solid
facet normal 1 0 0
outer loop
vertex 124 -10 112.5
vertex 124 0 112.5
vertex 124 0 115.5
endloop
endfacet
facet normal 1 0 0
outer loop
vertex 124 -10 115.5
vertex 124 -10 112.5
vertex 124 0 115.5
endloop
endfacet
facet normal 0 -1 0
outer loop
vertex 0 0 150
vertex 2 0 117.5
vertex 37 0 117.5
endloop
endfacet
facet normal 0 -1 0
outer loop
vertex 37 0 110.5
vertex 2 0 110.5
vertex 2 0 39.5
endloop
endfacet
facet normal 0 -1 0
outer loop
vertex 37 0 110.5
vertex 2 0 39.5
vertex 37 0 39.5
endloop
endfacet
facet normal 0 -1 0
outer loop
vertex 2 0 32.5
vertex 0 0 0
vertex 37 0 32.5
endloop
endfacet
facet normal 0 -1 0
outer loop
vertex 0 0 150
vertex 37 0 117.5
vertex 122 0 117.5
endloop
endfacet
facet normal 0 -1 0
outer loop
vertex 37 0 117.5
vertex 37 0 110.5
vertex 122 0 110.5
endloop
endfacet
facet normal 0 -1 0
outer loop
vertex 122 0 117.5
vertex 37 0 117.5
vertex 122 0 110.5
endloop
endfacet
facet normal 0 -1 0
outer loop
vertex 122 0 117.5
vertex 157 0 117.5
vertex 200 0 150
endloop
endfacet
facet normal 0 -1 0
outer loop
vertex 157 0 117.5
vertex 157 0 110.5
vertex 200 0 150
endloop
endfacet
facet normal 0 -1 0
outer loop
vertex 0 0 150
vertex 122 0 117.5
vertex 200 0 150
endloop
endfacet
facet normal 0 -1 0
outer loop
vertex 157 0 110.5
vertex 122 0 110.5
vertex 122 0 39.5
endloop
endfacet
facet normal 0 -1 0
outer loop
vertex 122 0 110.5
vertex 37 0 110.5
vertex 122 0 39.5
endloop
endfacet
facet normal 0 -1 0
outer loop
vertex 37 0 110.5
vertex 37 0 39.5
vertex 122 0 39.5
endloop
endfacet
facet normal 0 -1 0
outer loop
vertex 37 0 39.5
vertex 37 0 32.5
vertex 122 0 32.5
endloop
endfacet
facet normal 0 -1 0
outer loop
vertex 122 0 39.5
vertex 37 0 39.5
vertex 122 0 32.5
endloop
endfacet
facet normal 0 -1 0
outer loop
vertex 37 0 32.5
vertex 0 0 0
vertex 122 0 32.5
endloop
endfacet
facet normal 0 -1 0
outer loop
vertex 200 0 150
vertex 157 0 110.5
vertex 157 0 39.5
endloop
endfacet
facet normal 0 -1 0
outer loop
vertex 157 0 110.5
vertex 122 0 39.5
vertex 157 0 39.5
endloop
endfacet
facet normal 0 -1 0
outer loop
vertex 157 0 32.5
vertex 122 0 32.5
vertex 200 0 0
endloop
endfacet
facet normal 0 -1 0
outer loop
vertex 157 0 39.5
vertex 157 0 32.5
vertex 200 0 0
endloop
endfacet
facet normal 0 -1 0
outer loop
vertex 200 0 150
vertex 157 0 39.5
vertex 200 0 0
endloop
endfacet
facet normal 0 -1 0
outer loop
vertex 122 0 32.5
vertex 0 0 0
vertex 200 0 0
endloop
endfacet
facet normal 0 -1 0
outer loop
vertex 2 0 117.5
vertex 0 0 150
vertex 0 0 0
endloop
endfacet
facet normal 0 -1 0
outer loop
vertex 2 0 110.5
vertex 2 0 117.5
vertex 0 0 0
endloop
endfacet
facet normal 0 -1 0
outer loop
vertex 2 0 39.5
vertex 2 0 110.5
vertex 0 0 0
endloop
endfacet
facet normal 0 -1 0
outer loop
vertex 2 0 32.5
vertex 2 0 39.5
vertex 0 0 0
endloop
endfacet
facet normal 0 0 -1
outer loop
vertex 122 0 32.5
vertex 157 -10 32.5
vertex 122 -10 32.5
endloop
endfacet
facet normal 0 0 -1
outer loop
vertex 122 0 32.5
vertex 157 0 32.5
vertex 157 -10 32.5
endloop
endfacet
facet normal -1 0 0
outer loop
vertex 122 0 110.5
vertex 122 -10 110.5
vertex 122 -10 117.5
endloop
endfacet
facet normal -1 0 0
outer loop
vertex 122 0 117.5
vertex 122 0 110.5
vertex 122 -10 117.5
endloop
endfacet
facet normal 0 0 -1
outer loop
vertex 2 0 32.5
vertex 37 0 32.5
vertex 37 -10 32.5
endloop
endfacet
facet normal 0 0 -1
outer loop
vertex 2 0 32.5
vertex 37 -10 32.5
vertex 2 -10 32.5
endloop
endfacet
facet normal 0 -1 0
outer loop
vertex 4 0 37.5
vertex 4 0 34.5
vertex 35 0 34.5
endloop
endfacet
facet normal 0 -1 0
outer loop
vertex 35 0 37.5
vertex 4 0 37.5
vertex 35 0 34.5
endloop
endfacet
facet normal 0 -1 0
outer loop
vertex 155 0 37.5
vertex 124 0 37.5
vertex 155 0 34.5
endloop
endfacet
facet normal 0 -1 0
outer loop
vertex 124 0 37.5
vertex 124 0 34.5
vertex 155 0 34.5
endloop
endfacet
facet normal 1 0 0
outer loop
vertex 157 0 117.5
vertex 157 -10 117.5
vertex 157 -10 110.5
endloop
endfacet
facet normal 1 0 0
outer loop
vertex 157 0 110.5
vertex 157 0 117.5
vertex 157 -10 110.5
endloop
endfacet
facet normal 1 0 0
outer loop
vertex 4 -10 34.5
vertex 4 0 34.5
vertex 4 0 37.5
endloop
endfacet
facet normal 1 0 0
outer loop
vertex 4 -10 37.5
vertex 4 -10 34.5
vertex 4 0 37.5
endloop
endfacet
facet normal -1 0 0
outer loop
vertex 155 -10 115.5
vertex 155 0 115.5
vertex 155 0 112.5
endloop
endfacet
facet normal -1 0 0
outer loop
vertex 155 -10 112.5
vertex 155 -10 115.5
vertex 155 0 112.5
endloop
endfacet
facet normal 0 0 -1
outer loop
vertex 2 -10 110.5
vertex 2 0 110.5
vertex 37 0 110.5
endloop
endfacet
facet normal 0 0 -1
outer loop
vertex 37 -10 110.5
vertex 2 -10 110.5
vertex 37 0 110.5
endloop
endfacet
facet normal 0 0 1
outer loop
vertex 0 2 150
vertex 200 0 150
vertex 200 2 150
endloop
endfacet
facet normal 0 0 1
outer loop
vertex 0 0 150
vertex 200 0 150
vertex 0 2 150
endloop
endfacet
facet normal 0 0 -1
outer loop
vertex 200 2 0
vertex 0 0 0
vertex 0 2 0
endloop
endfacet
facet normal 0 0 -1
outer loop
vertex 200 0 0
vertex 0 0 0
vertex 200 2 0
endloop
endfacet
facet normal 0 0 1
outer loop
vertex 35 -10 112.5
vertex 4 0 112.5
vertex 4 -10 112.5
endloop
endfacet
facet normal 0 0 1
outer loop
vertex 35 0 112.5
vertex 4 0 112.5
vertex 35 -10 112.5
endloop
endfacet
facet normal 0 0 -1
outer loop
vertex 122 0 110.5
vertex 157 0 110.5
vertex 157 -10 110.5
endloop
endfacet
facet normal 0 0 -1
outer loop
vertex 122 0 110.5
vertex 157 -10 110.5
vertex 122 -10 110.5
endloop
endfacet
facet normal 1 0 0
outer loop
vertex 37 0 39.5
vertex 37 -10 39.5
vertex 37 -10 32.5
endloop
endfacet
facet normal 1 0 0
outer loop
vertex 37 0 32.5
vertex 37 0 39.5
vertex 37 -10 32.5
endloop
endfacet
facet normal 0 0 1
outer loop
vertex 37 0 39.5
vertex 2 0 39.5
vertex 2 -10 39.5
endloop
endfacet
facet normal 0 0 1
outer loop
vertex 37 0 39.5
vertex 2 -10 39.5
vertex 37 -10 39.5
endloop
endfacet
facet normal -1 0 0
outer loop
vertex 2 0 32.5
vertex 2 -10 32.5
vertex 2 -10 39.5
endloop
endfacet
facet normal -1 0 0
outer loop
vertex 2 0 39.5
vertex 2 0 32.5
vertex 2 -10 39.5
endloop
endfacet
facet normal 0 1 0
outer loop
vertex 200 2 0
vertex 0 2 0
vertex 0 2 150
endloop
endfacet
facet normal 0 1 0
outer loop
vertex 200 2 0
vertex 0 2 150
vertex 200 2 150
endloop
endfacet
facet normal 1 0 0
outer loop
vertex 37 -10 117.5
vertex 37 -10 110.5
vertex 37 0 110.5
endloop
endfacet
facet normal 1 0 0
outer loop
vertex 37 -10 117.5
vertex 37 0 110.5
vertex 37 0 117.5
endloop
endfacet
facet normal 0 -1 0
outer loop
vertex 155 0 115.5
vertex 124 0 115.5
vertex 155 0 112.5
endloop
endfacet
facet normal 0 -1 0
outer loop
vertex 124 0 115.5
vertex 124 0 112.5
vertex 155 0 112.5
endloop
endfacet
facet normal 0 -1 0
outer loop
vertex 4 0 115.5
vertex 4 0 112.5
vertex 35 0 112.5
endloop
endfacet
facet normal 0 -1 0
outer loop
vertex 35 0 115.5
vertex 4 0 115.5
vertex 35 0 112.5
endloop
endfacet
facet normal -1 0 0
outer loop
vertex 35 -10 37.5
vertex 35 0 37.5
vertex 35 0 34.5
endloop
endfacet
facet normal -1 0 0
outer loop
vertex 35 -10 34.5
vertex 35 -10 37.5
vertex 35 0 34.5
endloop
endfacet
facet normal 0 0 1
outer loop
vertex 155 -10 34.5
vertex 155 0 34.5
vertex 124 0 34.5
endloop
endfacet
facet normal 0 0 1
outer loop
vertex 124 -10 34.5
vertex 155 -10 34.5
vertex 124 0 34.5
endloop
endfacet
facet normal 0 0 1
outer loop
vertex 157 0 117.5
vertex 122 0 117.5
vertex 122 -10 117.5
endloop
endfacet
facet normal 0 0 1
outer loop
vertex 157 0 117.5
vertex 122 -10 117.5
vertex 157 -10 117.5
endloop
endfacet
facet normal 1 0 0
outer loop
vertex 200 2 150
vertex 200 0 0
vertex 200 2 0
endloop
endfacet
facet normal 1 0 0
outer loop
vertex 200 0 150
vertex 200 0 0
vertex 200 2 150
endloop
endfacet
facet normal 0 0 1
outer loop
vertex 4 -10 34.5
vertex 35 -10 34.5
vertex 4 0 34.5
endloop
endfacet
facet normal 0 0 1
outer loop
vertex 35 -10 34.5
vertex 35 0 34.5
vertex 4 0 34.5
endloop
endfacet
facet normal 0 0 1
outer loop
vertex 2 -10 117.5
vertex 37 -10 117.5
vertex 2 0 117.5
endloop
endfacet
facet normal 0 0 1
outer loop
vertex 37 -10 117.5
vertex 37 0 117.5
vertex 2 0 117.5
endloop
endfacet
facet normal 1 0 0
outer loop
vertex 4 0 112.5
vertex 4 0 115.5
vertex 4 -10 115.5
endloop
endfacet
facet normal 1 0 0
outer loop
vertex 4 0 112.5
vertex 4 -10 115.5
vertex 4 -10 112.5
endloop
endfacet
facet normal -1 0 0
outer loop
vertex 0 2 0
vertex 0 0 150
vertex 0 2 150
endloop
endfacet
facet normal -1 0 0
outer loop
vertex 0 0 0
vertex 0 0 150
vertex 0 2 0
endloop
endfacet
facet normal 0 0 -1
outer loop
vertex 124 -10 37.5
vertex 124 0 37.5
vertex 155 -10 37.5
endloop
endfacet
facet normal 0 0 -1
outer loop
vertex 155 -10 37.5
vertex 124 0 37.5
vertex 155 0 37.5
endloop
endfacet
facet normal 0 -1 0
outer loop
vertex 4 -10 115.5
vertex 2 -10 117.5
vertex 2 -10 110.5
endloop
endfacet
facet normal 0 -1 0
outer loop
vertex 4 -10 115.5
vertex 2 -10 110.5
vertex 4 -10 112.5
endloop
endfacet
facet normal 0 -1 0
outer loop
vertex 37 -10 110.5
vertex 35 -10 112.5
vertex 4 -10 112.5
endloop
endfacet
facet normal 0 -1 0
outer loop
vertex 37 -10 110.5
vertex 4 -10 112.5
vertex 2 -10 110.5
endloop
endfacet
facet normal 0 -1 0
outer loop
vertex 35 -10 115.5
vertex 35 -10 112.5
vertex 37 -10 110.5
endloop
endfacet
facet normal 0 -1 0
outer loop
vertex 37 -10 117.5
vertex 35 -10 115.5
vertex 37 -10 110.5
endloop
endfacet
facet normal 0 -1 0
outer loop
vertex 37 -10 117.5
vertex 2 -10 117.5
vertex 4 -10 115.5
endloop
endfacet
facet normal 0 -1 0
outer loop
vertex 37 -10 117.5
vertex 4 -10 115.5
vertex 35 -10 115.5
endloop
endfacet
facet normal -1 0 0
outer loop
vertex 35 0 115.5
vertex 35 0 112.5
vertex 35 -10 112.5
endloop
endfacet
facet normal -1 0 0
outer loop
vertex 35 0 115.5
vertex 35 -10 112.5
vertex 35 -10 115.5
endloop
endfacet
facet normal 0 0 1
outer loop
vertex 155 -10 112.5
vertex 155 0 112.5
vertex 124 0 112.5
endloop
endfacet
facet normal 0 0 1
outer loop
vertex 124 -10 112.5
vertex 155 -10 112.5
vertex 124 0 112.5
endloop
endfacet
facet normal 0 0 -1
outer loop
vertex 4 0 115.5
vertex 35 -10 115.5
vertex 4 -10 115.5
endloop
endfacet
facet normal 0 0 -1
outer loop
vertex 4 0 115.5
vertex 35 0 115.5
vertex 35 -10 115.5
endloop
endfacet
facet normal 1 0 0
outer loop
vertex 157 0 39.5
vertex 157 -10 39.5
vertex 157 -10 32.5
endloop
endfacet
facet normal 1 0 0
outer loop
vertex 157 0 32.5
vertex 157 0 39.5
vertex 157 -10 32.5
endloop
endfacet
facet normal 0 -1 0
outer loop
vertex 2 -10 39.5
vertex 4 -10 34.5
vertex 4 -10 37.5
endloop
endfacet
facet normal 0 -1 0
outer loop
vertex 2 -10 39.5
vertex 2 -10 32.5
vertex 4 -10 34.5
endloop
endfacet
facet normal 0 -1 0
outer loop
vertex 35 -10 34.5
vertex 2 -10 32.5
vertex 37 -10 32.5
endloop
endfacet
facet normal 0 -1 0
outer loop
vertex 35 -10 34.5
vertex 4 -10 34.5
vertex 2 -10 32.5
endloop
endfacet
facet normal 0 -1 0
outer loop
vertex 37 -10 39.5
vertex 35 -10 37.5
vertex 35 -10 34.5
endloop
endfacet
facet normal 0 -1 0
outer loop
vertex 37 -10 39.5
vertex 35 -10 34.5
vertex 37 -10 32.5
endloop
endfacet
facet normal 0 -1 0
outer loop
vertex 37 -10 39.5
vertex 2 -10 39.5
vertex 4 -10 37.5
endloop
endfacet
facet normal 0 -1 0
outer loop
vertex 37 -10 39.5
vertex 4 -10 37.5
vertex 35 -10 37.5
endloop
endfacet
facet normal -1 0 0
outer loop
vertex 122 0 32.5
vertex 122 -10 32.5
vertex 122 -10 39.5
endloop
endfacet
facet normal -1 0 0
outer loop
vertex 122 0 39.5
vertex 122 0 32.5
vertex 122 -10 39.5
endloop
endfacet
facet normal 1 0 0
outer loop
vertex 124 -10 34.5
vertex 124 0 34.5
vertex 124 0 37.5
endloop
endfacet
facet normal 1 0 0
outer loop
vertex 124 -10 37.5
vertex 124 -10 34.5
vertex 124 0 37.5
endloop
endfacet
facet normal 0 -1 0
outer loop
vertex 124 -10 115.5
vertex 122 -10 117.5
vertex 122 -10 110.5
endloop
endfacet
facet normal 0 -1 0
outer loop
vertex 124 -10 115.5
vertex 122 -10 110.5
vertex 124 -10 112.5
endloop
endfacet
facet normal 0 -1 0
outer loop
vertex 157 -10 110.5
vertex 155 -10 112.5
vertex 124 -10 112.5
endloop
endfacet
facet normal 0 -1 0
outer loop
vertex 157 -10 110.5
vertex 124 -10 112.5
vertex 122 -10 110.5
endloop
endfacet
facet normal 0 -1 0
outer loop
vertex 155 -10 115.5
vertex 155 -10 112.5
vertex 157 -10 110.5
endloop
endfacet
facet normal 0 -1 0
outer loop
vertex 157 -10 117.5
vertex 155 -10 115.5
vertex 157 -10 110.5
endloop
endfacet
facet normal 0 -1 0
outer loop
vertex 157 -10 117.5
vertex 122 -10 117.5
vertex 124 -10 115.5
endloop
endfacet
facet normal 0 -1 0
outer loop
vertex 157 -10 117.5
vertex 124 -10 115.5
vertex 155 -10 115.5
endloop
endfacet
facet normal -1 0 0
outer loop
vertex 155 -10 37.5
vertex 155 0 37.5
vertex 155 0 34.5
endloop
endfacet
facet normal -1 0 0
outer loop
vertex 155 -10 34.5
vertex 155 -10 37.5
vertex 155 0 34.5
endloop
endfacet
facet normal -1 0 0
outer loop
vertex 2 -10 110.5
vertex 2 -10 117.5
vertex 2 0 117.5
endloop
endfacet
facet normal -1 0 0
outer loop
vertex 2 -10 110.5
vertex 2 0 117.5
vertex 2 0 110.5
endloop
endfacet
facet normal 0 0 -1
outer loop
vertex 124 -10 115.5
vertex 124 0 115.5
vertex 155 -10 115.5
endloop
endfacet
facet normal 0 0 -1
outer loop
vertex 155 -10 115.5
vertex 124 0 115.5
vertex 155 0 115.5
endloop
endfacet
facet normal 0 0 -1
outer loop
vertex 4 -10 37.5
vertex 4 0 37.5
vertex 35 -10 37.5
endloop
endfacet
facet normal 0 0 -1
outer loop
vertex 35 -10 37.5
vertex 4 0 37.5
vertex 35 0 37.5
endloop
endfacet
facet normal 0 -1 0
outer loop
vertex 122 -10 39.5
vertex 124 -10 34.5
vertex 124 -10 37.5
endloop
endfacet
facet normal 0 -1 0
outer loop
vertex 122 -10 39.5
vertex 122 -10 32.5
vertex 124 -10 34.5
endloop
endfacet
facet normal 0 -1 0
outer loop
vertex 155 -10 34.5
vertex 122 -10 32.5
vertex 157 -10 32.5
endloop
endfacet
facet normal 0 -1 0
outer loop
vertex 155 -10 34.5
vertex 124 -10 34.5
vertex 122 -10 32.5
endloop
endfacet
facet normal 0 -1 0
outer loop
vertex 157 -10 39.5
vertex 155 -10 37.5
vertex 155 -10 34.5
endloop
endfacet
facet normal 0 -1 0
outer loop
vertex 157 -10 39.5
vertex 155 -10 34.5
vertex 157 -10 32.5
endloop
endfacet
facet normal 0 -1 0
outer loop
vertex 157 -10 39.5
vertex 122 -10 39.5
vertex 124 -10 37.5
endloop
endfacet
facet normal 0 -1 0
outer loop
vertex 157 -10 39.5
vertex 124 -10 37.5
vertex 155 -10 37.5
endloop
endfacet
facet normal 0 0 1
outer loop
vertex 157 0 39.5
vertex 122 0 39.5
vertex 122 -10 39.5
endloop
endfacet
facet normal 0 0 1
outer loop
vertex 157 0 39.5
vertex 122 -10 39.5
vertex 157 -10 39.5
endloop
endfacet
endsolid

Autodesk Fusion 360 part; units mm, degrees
sketch "Sketch1" plane through (0, 0, 0) normal (0, 1, 0) x (1, 0, 0)
  line L0 (0, 0) -> (200, 0)
  line L1 (200, 0) -> (200, -150)
  line L2 (200, -150) -> (0, -150)
  line L3 (0, -150) -> (0, 0)
  dimension "d1" = 200
  dimension "d2" = 150
extrude "Extrude1" add sketch "Sketch1" along normal blind 2
sketch "Sketch2" plane through (0, 0, 0) normal (0, -1, 0) x (1, 0, 0)
  line L0 (200, 150) -> (0, 150)
  line L1 (0, 150) -> (0, 0)
  line L2 (0, 0) -> (200, 0)
  line L3 (200, 0) -> (200, 150)
  line L4 (4, 112.5) -> (35, 112.5)
  line L5 (35, 112.5) -> (35, 115.5)
  line L6 (35, 115.5) -> (4, 115.5)
  line L7 (4, 115.5) -> (4, 112.5)
  line L8 (37, 117.5) -> (2, 117.5)
  line L9 (2, 117.5) -> (2, 110.5)
  line L10 (2, 110.5) -> (37, 110.5)
  line L11 (37, 110.5) -> (37, 117.5)
  line L12 (200, 150) -> (0, 150)
  line L13 (0, 150) -> (0, 0)
  line L14 (0, 0) -> (200, 0)
  line L15 (200, 0) -> (200, 150)
  line L16 (2, 110.5) -> (37, 110.5)
  line L17 (200, 150) -> (0, 150)
  line L18 (0, 150) -> (0, 0)
  line L19 (0, 150) -> (0, 0)
  line L20 (35, 37.5) -> (35, 34.5)
  line L21 (0, 0) -> (200, 0)
  line L22 (122, 39.5) -> (157, 39.5)
  line L23 (35, 112.5) -> (35, 115.5)
  line L24 (37, 110.5) -> (2, 110.5)
  line L25 (2, 110.5) -> (2, 117.5)
  line L26 (2, 117.5) -> (37, 117.5)
  line L27 (37, 117.5) -> (37, 110.5)
  dimension "d5" = 31
  dimension "d6" = 3
  dimension "d7" = 35
  dimension "d8" = 7
  dimension "d9" = 2
  dimension "d10" = 2
  dimension "d18" = 32.5
  dimension "d19" = 2
extrude "Extrude2" add sketch "Sketch2" along normal blind 10 contours L8 L9 L10 L11 L16 L24 L25 L26 L27
sketch "Sketch3" plane through (0, 0, 0) normal (0, -1, 0) x (1, 0, 0)
  line L0 (200, 150) -> (0, 150)
  line L1 (0, 150) -> (0, 0)
  line L2 (0, 0) -> (200, 0)
  line L3 (200, 0) -> (200, 150)
  line L4 (4, 37.5) -> (35, 37.5)
  line L5 (35, 37.5) -> (35, 34.5)
  line L6 (35, 34.5) -> (4, 34.5)
  line L7 (4, 34.5) -> (4, 37.5)
  line L8 (2, 39.5) -> (37, 39.5)
  line L9 (37, 39.5) -> (37, 32.5)
  line L10 (37, 32.5) -> (2, 32.5)
  line L11 (2, 32.5) -> (2, 39.5)
  line L12 (2, 110.5) -> (37, 110.5)
  line L13 (0, 150) -> (0, 0)
  line L14 (37, 110.5) -> (2, 110.5)
  line L15 (2, 110.5) -> (2, 117.5)
  line L16 (2, 117.5) -> (37, 117.5)
  line L17 (37, 117.5) -> (37, 110.5)
  dimension "d11" = 3
  dimension "d12" = 31
  dimension "d13" = 2
  dimension "d14" = 7
  dimension "d15" = 35
  dimension "d16" = 2
  dimension "d17" = 71
  dimension "d20" = 2
extrude "Extrude3" add sketch "Sketch3" along normal blind 10 contours L8 L9 L10 L11
sketch "Sketch4" plane through (0, 0, 0) normal (0, -1, 0) x (1, 0, 0)
  line L0 (124, 37.5) -> (155, 37.5)
  line L1 (155, 37.5) -> (155, 34.5)
  line L2 (155, 34.5) -> (124, 34.5)
  line L3 (124, 34.5) -> (124, 37.5)
  line L4 (122, 39.5) -> (157, 39.5)
  line L5 (157, 39.5) -> (157, 32.5)
  line L6 (157, 32.5) -> (122, 32.5)
  line L7 (122, 32.5) -> (122, 39.5)
  line L8 (35, 37.5) -> (35, 34.5)
  line L9 (0, 0) -> (200, 0)
  dimension "d21" = 31
  dimension "d22" = 3
  dimension "d23" = 35
  dimension "d24" = 7
  dimension "d25" = 2
  dimension "d26" = 2
  dimension "d28" = 89
  dimension "d29" = 32.5
sketch "Sketch5" plane through (0, 0, 0) normal (0, -1, 0) x (1, 0, 0)
  line L0 (124, 115.5) -> (155, 115.5)
  line L1 (155, 115.5) -> (155, 112.5)
  line L2 (155, 112.5) -> (124, 112.5)
  line L3 (124, 112.5) -> (124, 115.5)
  line L4 (122, 117.5) -> (157, 117.5)
  line L5 (157, 117.5) -> (157, 110.5)
  line L6 (157, 110.5) -> (122, 110.5)
  line L7 (122, 110.5) -> (122, 117.5)
  line L8 (122, 39.5) -> (157, 39.5)
  line L9 (35, 112.5) -> (35, 115.5)
  dimension "d30" = 31
  dimension "d31" = 3
  dimension "d32" = 35
  dimension "d33" = 7
  dimension "d35" = 2
  dimension "d36" = 2
  dimension "d37" = 71
  dimension "d38" = 89
extrude "Extrude4" add sketch "Sketch4" along normal blind 10
extrude "Extrude5" add sketch "Sketch5" along normal blind 10
